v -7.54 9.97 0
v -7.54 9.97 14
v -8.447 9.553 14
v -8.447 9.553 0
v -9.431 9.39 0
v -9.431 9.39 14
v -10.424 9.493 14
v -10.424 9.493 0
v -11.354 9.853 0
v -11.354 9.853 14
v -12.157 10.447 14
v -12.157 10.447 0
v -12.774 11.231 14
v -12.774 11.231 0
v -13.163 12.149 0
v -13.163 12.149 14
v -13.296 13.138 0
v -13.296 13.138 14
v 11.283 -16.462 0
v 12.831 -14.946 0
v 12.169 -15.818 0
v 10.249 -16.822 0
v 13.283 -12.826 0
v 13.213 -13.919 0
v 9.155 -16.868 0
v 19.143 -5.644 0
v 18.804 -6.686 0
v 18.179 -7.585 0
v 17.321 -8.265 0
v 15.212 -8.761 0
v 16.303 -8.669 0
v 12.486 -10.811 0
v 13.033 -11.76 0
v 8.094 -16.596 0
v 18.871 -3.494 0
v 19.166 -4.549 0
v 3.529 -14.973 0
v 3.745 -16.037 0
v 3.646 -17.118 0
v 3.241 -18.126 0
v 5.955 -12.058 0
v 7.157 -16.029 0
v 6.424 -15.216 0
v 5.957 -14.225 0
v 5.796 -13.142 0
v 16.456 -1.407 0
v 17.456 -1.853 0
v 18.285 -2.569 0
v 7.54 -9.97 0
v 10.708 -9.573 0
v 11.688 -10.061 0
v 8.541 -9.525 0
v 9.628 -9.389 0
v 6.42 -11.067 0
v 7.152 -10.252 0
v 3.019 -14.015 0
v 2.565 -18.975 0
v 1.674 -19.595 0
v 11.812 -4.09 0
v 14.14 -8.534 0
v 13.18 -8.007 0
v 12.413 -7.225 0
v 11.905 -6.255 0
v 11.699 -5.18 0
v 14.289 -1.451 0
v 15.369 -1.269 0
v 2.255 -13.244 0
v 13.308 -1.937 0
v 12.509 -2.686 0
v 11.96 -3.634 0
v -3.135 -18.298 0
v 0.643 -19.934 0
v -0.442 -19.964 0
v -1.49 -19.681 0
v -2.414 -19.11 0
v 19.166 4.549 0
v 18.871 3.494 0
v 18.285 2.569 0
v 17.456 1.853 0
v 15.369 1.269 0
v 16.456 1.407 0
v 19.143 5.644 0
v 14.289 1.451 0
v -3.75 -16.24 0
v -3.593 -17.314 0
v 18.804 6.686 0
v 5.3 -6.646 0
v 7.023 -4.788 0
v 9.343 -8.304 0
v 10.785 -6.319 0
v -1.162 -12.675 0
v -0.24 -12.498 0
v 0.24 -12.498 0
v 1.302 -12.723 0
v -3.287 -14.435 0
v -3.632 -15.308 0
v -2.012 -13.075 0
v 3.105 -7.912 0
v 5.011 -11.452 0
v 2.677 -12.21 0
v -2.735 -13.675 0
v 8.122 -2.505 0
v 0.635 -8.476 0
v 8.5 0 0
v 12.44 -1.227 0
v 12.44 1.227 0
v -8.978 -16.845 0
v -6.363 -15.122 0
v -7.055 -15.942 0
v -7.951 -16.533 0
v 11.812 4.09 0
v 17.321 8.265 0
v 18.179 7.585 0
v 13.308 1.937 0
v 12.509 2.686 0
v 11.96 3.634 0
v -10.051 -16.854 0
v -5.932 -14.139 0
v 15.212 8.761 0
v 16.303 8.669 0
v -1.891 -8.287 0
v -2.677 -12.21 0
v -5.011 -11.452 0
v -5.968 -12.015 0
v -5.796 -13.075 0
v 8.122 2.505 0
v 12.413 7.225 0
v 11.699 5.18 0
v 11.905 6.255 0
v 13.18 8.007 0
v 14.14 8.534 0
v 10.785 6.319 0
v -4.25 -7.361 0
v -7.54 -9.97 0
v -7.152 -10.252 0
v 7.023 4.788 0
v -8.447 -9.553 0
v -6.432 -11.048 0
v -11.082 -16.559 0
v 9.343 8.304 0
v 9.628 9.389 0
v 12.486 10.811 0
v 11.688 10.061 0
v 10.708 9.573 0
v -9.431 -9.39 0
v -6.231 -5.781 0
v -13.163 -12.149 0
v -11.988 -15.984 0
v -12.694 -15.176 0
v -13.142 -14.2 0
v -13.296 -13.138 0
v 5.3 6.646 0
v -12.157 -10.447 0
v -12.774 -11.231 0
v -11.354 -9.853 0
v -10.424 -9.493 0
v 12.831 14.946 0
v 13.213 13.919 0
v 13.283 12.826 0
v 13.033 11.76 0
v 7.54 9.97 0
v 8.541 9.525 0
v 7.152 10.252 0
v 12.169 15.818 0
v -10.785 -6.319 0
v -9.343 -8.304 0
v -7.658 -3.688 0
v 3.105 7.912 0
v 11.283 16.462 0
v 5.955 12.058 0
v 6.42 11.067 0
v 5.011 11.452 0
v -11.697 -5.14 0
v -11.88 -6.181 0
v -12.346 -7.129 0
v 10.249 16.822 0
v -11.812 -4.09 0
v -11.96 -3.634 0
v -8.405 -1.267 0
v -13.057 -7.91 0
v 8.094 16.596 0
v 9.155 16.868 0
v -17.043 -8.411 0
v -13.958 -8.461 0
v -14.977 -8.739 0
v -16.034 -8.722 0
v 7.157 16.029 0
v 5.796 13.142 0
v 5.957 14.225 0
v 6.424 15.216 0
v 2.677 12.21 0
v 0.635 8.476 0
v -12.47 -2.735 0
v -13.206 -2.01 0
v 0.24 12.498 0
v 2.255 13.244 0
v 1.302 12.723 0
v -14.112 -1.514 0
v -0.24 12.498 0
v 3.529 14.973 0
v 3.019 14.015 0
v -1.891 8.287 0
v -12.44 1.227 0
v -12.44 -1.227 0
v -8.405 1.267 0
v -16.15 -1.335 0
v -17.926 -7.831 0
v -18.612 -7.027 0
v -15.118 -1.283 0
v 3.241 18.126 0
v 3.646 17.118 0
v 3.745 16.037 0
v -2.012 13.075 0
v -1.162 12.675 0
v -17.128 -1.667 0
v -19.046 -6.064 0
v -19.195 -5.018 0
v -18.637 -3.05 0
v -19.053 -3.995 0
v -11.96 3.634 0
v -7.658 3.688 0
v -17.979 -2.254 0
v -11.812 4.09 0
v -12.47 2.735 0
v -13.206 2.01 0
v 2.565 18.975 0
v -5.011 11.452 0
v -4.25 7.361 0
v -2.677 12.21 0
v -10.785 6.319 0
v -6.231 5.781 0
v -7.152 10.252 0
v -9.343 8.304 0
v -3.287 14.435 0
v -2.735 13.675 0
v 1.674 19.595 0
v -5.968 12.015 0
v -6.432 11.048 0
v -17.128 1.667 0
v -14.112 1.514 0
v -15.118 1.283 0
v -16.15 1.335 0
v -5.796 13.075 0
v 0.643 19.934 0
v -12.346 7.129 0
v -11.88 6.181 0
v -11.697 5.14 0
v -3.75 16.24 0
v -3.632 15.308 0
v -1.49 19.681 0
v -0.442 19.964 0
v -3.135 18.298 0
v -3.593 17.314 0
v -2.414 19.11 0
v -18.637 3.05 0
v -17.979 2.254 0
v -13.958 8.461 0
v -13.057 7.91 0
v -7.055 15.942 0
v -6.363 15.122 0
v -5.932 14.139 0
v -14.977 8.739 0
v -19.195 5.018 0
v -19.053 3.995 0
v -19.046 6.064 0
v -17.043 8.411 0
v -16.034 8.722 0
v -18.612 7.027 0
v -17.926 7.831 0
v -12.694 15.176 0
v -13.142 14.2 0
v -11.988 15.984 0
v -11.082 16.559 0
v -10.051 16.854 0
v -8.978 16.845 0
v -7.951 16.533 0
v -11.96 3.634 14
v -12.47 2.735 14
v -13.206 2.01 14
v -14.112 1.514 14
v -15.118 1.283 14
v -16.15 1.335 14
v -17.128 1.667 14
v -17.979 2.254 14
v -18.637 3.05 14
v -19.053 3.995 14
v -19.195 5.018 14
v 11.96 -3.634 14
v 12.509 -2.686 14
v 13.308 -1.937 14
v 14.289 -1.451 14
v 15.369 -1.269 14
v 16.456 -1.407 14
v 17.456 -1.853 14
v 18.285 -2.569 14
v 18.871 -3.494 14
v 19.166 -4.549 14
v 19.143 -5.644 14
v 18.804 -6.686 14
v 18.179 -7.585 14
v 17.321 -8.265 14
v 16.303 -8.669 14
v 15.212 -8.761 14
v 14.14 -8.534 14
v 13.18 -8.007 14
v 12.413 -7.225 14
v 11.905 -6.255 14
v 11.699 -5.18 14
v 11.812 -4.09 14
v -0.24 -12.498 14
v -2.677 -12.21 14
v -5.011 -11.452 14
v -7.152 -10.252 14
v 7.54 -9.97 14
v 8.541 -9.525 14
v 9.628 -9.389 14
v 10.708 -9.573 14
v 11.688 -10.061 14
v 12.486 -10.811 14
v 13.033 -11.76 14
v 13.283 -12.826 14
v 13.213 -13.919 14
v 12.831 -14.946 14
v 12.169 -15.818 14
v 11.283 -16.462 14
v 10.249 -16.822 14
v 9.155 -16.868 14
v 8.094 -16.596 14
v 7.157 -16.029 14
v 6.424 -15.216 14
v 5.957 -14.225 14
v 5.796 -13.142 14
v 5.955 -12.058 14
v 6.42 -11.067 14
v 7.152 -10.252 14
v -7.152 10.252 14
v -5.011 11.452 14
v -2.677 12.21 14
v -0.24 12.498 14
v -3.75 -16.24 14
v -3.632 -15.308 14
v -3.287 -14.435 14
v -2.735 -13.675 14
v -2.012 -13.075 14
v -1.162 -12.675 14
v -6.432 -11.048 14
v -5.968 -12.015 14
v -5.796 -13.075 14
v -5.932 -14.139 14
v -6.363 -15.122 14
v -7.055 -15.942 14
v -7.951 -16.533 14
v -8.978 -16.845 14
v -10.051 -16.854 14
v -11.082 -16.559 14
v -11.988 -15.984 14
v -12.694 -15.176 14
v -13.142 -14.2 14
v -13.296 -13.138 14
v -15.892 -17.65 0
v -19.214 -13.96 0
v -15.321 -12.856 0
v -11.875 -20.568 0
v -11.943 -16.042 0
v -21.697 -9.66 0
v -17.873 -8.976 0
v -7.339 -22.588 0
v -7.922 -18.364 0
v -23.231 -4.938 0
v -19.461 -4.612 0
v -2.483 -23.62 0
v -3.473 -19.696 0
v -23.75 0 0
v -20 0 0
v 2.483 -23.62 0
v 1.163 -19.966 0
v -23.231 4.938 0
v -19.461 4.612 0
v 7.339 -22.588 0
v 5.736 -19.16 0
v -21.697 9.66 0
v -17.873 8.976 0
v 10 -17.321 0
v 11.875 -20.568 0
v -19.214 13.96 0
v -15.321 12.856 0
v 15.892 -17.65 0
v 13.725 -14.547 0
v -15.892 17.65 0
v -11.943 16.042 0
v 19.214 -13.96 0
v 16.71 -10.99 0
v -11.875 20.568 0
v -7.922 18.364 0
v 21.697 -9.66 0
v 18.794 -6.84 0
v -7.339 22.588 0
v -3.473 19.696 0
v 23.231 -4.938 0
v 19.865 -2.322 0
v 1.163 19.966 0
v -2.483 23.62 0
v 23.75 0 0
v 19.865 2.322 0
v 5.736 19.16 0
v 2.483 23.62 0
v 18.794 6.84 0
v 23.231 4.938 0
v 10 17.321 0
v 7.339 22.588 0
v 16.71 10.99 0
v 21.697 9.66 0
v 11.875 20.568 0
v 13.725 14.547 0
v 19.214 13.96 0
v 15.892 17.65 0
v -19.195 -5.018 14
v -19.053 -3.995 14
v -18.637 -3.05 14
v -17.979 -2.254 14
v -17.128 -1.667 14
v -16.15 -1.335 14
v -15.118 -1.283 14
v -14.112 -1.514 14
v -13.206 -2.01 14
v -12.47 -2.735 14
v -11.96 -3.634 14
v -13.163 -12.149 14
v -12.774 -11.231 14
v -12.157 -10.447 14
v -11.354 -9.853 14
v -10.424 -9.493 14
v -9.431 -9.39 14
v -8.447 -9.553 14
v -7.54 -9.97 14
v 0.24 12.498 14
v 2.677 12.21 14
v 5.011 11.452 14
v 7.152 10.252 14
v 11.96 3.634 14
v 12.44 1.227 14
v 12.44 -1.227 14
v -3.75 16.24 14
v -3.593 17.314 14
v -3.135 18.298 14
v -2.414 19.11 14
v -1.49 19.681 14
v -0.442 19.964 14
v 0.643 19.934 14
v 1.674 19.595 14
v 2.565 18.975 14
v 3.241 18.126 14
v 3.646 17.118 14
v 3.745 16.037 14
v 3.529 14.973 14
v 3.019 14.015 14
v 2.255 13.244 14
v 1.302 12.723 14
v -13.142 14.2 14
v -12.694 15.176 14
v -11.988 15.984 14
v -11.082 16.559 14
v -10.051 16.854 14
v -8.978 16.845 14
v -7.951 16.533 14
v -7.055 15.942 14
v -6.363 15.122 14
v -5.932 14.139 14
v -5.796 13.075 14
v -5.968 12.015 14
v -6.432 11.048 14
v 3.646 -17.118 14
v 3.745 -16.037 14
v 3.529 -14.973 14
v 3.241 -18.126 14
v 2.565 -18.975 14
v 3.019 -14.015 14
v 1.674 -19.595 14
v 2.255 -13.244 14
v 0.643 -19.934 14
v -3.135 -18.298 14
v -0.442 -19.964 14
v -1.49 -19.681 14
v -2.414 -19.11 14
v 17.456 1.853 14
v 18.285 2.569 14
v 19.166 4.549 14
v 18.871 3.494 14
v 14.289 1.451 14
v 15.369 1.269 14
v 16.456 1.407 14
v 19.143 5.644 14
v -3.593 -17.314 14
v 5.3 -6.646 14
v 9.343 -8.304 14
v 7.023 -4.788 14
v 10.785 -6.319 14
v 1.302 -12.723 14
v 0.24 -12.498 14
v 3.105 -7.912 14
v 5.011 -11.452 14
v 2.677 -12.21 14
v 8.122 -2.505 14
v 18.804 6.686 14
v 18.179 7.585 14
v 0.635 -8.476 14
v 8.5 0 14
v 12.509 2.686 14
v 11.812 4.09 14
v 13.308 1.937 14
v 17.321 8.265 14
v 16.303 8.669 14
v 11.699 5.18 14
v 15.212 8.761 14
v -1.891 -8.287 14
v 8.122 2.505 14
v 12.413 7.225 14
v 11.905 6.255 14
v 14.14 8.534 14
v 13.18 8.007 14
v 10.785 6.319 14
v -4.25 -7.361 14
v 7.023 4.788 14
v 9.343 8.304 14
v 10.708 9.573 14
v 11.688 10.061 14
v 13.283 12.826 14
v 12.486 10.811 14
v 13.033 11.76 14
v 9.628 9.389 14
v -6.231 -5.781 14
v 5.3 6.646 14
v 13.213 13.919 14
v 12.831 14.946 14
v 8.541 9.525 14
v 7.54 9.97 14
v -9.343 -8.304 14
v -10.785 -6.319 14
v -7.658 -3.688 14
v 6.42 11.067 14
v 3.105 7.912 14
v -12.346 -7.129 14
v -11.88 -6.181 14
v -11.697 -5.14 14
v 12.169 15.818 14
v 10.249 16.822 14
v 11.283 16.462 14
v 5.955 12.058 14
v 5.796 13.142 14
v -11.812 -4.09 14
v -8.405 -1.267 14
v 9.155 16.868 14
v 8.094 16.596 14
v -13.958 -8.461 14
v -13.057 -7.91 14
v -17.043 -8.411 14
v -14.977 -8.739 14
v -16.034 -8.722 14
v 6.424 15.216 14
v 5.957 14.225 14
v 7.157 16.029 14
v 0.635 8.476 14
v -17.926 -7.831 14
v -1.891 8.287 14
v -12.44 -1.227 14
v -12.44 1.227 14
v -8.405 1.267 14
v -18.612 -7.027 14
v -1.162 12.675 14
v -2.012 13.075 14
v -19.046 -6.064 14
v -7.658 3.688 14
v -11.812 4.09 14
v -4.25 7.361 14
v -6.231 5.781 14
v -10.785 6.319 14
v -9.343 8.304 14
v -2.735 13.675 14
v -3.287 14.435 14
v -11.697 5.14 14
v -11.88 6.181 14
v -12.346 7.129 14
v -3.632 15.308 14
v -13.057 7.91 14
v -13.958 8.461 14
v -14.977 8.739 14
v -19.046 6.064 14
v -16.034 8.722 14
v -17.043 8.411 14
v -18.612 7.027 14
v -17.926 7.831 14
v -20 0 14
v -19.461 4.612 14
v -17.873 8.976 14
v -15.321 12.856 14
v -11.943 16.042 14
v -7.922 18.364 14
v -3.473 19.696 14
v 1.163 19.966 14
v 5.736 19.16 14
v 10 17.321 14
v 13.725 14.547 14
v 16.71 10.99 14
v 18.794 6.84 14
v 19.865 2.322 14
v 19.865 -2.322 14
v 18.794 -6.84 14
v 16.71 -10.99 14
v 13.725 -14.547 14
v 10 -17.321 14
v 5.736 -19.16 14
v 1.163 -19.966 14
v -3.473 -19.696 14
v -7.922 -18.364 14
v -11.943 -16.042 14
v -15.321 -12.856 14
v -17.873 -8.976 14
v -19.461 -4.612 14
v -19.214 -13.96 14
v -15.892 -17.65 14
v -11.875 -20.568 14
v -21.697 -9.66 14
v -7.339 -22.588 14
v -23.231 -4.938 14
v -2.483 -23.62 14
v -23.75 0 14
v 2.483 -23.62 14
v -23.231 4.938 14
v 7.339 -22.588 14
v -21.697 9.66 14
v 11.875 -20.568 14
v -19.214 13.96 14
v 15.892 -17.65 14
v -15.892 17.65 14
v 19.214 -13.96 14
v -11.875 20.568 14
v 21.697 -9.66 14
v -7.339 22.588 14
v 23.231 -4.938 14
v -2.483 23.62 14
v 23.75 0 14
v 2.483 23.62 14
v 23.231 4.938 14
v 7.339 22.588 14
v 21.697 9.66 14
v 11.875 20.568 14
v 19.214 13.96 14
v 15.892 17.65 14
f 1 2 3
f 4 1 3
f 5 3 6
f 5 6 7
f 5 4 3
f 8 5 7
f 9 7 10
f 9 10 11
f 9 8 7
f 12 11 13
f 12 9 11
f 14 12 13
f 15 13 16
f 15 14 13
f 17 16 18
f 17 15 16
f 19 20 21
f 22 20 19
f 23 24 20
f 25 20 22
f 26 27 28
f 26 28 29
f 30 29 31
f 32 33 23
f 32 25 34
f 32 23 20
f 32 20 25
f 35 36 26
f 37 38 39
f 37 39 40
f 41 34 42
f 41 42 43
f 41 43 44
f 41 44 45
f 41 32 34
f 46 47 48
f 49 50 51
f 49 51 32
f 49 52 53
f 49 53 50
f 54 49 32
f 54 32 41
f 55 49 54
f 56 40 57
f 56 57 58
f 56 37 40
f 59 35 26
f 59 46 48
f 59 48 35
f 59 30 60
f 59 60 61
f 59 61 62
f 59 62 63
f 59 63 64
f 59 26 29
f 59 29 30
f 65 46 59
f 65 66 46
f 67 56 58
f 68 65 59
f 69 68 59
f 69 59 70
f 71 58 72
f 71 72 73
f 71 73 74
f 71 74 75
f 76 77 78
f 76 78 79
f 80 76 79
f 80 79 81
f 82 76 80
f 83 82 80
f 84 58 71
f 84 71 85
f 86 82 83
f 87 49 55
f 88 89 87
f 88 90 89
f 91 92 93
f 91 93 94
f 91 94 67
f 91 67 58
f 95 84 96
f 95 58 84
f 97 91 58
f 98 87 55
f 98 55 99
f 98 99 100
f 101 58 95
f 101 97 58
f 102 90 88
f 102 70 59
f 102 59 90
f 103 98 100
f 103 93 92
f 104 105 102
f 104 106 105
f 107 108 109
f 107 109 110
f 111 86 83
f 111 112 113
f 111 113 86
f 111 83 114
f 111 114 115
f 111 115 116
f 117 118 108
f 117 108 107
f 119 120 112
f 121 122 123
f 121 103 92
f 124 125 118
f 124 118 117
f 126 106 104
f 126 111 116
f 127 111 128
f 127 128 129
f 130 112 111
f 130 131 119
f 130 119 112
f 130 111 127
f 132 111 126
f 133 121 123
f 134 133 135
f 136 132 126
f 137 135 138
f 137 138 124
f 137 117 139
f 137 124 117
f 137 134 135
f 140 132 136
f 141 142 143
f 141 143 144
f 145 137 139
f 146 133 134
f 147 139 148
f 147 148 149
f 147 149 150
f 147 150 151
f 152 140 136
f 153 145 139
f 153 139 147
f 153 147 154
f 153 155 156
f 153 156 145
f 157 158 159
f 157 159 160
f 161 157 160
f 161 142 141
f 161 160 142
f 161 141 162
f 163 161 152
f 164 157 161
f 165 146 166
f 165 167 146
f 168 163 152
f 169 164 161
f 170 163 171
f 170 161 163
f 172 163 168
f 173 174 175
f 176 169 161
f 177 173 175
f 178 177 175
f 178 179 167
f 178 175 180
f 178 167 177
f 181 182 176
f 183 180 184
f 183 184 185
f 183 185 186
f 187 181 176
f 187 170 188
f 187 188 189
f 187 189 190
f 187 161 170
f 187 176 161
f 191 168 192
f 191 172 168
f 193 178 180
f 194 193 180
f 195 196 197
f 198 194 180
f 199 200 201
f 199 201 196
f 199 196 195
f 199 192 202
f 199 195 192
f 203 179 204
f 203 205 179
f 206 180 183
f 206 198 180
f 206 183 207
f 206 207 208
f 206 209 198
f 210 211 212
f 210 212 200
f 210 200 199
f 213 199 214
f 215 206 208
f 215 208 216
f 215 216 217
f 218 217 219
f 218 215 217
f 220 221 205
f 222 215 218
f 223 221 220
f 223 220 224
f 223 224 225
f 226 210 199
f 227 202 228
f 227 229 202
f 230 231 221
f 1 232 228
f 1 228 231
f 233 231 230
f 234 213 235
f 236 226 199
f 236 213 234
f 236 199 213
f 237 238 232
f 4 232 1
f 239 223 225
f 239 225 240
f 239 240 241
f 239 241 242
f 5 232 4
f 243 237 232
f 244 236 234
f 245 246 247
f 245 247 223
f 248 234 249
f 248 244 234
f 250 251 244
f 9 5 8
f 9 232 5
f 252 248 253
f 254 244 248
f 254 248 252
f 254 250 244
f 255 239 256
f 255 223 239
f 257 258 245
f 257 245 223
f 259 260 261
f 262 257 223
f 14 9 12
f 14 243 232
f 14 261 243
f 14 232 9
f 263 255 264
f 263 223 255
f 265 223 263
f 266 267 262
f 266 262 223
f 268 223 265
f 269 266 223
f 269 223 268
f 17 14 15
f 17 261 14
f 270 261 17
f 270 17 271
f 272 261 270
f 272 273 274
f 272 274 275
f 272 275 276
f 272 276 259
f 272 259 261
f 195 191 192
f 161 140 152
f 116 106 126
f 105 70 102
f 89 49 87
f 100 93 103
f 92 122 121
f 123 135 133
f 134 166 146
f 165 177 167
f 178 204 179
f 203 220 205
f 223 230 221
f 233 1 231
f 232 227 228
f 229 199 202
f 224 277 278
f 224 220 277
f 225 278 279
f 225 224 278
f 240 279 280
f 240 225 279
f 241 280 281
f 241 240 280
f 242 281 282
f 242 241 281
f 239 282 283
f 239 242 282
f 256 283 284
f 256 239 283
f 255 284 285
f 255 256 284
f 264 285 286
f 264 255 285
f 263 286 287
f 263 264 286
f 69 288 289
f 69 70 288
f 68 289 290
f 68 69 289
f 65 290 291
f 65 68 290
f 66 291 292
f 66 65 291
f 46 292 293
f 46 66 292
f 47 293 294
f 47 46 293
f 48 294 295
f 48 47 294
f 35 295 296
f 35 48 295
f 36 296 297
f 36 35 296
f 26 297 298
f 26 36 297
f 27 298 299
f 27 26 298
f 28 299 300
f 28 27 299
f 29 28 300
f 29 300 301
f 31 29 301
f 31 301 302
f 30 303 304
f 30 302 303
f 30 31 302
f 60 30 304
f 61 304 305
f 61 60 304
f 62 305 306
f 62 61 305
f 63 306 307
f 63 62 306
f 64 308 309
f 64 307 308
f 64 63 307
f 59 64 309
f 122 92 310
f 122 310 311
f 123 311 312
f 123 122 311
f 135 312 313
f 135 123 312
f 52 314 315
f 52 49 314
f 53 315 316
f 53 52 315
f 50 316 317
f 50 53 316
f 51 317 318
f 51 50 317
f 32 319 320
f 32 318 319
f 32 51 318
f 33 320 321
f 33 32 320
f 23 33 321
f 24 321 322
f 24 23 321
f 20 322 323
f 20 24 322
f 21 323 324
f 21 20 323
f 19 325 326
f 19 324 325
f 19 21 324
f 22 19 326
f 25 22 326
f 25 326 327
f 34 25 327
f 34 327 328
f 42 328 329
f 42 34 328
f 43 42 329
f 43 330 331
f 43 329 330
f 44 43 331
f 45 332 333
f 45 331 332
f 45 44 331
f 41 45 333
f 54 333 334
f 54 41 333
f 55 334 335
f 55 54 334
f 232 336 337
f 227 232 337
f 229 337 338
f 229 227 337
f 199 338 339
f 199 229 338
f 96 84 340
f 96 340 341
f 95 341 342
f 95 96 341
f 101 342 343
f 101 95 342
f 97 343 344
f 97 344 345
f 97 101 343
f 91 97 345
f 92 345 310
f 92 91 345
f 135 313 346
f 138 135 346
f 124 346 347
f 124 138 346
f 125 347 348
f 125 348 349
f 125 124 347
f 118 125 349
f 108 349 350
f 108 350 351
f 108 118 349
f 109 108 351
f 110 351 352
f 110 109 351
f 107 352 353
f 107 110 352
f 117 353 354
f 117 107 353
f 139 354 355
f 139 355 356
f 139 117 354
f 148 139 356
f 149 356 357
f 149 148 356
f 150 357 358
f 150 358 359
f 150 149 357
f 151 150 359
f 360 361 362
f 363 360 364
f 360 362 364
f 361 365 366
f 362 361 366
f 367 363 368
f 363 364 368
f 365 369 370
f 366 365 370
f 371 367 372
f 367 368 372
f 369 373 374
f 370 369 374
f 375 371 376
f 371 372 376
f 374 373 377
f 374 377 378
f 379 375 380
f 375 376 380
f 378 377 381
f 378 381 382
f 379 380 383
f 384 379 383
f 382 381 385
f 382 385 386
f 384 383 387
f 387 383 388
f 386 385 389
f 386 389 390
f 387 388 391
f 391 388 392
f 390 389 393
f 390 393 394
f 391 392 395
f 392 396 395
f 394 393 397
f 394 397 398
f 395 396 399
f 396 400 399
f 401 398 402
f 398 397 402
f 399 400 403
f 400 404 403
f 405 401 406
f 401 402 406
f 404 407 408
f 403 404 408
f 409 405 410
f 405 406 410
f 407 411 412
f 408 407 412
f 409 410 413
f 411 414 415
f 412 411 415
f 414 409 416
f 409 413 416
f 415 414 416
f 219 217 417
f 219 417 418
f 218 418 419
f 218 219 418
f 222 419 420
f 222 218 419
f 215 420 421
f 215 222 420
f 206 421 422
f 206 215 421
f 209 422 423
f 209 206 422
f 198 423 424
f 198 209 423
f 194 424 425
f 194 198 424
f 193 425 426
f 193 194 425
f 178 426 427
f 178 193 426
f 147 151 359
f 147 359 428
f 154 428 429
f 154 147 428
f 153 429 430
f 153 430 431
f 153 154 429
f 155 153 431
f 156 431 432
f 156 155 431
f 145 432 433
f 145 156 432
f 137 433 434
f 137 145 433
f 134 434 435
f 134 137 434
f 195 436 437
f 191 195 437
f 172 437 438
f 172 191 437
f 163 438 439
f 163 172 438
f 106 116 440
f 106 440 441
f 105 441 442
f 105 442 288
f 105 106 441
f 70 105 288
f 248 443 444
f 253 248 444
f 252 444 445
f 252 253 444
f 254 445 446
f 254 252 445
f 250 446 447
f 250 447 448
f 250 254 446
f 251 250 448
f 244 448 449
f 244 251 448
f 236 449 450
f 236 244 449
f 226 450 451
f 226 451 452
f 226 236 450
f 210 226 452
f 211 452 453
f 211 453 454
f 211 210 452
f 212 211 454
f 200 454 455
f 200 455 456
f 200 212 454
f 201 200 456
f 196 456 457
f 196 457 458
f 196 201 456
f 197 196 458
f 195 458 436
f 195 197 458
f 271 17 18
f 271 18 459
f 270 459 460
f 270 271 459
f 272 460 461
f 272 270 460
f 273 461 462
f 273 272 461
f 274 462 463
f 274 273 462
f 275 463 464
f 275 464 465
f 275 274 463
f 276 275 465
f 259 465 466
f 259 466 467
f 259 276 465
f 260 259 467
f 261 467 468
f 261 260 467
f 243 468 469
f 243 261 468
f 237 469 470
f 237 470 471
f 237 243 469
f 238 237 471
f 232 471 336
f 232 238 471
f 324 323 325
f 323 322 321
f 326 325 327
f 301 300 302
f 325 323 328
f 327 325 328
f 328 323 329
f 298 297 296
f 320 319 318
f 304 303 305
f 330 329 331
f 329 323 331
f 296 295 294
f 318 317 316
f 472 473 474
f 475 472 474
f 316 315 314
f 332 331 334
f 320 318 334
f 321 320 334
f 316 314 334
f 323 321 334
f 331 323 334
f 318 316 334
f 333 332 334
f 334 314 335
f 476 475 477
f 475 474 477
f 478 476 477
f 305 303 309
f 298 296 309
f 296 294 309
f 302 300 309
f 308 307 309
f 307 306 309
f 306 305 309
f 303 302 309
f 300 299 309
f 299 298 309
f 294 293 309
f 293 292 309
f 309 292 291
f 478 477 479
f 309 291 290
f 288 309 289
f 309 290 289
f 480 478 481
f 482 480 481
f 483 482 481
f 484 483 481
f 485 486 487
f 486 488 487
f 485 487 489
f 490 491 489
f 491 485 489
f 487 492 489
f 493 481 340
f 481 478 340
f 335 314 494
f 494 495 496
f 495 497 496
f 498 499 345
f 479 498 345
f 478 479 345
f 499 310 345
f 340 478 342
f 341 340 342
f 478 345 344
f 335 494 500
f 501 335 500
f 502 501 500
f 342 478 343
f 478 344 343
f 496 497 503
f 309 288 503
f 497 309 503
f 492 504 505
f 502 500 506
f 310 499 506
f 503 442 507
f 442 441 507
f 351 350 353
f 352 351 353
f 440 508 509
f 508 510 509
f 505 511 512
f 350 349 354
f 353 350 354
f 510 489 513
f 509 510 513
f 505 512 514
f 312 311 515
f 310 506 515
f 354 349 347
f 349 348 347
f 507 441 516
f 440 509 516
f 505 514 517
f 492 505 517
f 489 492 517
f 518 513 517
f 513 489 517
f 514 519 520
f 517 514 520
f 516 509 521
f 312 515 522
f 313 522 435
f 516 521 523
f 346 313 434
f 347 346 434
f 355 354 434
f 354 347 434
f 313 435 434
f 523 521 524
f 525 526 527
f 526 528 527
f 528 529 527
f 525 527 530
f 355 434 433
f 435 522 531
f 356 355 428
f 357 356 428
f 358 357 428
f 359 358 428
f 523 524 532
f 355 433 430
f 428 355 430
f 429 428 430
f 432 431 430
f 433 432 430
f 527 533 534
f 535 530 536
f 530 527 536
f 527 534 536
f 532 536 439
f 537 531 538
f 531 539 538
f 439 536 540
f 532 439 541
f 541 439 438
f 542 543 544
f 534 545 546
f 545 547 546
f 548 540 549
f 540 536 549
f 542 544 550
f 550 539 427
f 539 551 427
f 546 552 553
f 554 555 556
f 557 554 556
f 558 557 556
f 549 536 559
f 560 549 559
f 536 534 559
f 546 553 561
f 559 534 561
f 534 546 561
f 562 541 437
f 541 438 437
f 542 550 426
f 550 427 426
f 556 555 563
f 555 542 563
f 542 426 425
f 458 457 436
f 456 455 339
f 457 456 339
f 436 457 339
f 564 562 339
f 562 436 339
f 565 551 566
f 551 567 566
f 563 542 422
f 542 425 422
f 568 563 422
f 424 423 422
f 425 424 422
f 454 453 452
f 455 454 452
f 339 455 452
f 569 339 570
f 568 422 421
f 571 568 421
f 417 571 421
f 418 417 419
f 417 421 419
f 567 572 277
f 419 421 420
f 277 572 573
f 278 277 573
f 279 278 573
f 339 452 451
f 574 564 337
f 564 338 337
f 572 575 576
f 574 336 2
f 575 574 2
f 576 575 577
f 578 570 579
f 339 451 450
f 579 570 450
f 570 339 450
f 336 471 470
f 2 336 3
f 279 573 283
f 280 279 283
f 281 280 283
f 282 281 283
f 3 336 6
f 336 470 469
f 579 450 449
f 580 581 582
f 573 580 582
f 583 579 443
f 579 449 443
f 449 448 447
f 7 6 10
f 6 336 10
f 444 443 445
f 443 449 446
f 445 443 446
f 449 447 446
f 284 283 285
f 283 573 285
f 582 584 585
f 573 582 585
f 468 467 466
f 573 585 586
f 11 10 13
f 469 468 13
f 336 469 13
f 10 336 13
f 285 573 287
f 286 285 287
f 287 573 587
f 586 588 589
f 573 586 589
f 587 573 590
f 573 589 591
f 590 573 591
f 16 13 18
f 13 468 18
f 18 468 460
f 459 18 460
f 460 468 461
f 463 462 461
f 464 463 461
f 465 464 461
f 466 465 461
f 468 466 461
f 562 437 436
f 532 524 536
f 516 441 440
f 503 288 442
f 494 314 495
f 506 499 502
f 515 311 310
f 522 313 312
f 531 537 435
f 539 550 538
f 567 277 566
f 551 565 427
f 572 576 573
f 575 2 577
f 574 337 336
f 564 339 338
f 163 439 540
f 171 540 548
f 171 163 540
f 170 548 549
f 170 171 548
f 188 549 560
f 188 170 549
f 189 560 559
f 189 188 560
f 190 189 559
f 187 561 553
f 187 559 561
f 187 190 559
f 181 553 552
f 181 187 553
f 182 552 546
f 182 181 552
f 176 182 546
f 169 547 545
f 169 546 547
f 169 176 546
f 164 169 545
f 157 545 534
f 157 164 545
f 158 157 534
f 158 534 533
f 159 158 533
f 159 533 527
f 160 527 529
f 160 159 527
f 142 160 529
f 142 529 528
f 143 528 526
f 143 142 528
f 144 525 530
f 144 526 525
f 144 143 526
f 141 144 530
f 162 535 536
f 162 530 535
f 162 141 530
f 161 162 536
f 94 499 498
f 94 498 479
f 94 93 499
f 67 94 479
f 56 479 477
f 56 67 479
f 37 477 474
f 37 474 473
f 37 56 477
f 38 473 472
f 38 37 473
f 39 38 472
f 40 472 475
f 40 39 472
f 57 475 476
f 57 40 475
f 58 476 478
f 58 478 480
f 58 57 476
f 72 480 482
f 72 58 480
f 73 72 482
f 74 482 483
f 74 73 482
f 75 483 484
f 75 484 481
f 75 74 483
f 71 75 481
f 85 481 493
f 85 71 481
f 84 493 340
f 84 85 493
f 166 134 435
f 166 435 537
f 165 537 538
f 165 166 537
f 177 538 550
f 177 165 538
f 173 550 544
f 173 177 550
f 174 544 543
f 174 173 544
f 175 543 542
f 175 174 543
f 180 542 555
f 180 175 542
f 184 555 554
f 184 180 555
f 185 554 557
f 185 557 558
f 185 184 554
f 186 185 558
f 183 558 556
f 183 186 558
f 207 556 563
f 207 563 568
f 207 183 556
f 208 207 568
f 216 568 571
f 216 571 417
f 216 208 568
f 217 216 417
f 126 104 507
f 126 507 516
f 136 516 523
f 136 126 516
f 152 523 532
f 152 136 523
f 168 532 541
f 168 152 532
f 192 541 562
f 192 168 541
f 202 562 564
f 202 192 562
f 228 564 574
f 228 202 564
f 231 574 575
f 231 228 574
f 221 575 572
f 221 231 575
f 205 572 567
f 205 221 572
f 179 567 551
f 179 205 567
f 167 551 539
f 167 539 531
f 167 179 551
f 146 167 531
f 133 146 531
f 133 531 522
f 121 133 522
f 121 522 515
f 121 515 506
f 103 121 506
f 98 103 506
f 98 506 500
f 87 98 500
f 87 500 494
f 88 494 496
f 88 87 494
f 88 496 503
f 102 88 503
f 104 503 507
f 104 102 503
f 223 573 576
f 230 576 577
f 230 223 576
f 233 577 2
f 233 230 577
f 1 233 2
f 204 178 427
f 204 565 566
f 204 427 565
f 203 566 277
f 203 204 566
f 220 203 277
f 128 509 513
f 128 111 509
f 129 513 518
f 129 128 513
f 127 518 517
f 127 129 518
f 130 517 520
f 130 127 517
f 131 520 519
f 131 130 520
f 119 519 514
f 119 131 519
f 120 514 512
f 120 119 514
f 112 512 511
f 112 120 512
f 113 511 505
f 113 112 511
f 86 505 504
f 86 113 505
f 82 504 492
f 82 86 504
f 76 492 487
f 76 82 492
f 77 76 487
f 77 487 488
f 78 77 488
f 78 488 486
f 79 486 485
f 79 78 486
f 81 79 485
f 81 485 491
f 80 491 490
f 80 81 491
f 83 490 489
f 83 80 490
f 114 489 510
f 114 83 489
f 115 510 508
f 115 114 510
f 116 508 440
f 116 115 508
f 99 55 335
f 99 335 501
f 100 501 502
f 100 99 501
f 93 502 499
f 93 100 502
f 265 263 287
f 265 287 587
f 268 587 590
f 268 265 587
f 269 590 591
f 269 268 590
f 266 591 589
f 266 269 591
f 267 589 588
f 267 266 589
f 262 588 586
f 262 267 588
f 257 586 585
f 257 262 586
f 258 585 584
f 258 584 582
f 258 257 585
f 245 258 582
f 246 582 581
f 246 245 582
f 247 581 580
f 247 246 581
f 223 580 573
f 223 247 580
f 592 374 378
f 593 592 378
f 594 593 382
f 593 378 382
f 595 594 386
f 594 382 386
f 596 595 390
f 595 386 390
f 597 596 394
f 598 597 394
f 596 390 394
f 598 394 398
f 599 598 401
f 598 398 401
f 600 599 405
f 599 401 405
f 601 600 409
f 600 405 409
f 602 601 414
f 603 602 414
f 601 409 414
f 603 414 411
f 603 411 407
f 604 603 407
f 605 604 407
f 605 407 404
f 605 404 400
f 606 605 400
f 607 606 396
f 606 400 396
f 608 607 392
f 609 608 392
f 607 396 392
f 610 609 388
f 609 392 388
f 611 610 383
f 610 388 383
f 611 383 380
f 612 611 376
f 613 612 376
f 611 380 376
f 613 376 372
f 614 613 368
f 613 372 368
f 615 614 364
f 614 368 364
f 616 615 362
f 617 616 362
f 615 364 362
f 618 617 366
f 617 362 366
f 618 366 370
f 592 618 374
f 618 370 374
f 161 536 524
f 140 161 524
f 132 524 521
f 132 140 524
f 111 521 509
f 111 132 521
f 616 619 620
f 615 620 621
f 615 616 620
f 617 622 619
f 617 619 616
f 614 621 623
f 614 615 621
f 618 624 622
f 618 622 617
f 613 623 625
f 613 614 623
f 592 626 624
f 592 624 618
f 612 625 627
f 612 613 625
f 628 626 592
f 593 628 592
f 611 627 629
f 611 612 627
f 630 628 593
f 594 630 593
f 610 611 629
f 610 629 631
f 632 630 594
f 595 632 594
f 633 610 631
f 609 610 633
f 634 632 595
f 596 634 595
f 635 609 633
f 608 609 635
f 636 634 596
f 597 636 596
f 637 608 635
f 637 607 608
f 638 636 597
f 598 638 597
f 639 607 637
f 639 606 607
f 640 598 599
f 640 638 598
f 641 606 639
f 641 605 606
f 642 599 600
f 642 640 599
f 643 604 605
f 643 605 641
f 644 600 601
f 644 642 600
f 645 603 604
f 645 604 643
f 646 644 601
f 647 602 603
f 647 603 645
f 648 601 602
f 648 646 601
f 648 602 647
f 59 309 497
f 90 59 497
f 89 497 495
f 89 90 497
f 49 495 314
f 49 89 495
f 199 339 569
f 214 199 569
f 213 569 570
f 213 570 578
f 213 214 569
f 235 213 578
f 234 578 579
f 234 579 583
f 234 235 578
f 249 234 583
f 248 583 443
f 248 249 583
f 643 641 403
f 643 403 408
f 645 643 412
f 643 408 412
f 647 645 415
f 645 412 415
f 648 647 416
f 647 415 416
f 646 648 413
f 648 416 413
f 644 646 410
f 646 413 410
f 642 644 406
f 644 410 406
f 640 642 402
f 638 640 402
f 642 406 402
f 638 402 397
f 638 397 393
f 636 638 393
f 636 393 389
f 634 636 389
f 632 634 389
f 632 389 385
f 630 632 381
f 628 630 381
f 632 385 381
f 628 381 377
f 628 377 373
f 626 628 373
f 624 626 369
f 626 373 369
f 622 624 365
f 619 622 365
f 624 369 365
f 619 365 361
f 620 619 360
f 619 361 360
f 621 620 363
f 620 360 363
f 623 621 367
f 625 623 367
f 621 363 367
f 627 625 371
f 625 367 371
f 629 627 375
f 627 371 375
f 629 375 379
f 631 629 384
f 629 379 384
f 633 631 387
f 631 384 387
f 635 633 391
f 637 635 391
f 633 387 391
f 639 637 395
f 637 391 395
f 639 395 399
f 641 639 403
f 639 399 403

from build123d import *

# Parameters (mm, degrees)
CROQUIS1_R              = 23.75
CROQUIS1_R_2            = 8.5
SALIENTE_EXTRUIR1_DEPTH = 14
CROQUIS2_R              = 20
CROQUIS2_R_2            = 12.5
CORTAR_EXTRUIR1_DEPTH   = 14
CROQUIS3_R              = 3.75
SALIENTE_EXTRUIR2_DEPTH = 14


with BuildPart() as part:
    # Croquis1 → Saliente-Extruir1 (new body)
    with BuildSketch(Plane.XY):
        Circle(CROQUIS1_R)
        Circle(CROQUIS1_R_2, mode=Mode.SUBTRACT)
    extrude(amount=SALIENTE_EXTRUIR1_DEPTH)

    # Croquis2 → Cortar-Extruir1 (cut)
    with BuildSketch(Plane(origin=(0, 0, 0), x_dir=(-1, 0, 0), z_dir=(0, 0, -1))):
        Circle(CROQUIS2_R)
        Circle(CROQUIS2_R_2, mode=Mode.SUBTRACT)
    extrude(amount=-CORTAR_EXTRUIR1_DEPTH, mode=Mode.SUBTRACT)


with BuildPart() as cortar_extruir1_piece_1:
    # of the separate pieces the step leaves, piece 1, a body of its own (cortar_extruir1_pieces)
    add(part.part.solids().sort_by_distance((23.75, 0, 0))[0])


with BuildPart() as cortar_extruir1_piece_2:
    # of the separate pieces the step leaves, piece 2, a body of its own (cortar_extruir1_pieces)
    add(part.part.solids().sort_by_distance((-12.5, 0, 0))[0])

    # Croquis3 → Saliente-Extruir2 (add)
    with BuildSketch(Plane(origin=(0, 0, 0), x_dir=(-1, 0, 0), z_dir=(0, 0, -1))):
        with Locations((0, 16.24)):
            Circle(CROQUIS3_R)
        with Locations((9.545632497, 13.138435989)):
            Circle(CROQUIS3_R)
        with Locations((15.445157825, 5.018435989)):
            Circle(CROQUIS3_R)
        with Locations((15.445157825, -5.018435989)):
            Circle(CROQUIS3_R)
        with Locations((9.545632497, -13.138435989)):
            Circle(CROQUIS3_R)
        with Locations((0, -16.24)):
            Circle(CROQUIS3_R)
        with Locations((-9.545632497, -13.138435989)):
            Circle(CROQUIS3_R)
        with Locations((-15.445157825, -5.018435989)):
            Circle(CROQUIS3_R)
        with Locations((-15.445157825, 5.018435989)):
            Circle(CROQUIS3_R)
        with Locations((-9.545632497, 13.138435989)):
            Circle(CROQUIS3_R)
    extrude(amount=-SALIENTE_EXTRUIR2_DEPTH)


solid = Compound([cortar_extruir1_piece_1.part, cortar_extruir1_piece_2.part])
